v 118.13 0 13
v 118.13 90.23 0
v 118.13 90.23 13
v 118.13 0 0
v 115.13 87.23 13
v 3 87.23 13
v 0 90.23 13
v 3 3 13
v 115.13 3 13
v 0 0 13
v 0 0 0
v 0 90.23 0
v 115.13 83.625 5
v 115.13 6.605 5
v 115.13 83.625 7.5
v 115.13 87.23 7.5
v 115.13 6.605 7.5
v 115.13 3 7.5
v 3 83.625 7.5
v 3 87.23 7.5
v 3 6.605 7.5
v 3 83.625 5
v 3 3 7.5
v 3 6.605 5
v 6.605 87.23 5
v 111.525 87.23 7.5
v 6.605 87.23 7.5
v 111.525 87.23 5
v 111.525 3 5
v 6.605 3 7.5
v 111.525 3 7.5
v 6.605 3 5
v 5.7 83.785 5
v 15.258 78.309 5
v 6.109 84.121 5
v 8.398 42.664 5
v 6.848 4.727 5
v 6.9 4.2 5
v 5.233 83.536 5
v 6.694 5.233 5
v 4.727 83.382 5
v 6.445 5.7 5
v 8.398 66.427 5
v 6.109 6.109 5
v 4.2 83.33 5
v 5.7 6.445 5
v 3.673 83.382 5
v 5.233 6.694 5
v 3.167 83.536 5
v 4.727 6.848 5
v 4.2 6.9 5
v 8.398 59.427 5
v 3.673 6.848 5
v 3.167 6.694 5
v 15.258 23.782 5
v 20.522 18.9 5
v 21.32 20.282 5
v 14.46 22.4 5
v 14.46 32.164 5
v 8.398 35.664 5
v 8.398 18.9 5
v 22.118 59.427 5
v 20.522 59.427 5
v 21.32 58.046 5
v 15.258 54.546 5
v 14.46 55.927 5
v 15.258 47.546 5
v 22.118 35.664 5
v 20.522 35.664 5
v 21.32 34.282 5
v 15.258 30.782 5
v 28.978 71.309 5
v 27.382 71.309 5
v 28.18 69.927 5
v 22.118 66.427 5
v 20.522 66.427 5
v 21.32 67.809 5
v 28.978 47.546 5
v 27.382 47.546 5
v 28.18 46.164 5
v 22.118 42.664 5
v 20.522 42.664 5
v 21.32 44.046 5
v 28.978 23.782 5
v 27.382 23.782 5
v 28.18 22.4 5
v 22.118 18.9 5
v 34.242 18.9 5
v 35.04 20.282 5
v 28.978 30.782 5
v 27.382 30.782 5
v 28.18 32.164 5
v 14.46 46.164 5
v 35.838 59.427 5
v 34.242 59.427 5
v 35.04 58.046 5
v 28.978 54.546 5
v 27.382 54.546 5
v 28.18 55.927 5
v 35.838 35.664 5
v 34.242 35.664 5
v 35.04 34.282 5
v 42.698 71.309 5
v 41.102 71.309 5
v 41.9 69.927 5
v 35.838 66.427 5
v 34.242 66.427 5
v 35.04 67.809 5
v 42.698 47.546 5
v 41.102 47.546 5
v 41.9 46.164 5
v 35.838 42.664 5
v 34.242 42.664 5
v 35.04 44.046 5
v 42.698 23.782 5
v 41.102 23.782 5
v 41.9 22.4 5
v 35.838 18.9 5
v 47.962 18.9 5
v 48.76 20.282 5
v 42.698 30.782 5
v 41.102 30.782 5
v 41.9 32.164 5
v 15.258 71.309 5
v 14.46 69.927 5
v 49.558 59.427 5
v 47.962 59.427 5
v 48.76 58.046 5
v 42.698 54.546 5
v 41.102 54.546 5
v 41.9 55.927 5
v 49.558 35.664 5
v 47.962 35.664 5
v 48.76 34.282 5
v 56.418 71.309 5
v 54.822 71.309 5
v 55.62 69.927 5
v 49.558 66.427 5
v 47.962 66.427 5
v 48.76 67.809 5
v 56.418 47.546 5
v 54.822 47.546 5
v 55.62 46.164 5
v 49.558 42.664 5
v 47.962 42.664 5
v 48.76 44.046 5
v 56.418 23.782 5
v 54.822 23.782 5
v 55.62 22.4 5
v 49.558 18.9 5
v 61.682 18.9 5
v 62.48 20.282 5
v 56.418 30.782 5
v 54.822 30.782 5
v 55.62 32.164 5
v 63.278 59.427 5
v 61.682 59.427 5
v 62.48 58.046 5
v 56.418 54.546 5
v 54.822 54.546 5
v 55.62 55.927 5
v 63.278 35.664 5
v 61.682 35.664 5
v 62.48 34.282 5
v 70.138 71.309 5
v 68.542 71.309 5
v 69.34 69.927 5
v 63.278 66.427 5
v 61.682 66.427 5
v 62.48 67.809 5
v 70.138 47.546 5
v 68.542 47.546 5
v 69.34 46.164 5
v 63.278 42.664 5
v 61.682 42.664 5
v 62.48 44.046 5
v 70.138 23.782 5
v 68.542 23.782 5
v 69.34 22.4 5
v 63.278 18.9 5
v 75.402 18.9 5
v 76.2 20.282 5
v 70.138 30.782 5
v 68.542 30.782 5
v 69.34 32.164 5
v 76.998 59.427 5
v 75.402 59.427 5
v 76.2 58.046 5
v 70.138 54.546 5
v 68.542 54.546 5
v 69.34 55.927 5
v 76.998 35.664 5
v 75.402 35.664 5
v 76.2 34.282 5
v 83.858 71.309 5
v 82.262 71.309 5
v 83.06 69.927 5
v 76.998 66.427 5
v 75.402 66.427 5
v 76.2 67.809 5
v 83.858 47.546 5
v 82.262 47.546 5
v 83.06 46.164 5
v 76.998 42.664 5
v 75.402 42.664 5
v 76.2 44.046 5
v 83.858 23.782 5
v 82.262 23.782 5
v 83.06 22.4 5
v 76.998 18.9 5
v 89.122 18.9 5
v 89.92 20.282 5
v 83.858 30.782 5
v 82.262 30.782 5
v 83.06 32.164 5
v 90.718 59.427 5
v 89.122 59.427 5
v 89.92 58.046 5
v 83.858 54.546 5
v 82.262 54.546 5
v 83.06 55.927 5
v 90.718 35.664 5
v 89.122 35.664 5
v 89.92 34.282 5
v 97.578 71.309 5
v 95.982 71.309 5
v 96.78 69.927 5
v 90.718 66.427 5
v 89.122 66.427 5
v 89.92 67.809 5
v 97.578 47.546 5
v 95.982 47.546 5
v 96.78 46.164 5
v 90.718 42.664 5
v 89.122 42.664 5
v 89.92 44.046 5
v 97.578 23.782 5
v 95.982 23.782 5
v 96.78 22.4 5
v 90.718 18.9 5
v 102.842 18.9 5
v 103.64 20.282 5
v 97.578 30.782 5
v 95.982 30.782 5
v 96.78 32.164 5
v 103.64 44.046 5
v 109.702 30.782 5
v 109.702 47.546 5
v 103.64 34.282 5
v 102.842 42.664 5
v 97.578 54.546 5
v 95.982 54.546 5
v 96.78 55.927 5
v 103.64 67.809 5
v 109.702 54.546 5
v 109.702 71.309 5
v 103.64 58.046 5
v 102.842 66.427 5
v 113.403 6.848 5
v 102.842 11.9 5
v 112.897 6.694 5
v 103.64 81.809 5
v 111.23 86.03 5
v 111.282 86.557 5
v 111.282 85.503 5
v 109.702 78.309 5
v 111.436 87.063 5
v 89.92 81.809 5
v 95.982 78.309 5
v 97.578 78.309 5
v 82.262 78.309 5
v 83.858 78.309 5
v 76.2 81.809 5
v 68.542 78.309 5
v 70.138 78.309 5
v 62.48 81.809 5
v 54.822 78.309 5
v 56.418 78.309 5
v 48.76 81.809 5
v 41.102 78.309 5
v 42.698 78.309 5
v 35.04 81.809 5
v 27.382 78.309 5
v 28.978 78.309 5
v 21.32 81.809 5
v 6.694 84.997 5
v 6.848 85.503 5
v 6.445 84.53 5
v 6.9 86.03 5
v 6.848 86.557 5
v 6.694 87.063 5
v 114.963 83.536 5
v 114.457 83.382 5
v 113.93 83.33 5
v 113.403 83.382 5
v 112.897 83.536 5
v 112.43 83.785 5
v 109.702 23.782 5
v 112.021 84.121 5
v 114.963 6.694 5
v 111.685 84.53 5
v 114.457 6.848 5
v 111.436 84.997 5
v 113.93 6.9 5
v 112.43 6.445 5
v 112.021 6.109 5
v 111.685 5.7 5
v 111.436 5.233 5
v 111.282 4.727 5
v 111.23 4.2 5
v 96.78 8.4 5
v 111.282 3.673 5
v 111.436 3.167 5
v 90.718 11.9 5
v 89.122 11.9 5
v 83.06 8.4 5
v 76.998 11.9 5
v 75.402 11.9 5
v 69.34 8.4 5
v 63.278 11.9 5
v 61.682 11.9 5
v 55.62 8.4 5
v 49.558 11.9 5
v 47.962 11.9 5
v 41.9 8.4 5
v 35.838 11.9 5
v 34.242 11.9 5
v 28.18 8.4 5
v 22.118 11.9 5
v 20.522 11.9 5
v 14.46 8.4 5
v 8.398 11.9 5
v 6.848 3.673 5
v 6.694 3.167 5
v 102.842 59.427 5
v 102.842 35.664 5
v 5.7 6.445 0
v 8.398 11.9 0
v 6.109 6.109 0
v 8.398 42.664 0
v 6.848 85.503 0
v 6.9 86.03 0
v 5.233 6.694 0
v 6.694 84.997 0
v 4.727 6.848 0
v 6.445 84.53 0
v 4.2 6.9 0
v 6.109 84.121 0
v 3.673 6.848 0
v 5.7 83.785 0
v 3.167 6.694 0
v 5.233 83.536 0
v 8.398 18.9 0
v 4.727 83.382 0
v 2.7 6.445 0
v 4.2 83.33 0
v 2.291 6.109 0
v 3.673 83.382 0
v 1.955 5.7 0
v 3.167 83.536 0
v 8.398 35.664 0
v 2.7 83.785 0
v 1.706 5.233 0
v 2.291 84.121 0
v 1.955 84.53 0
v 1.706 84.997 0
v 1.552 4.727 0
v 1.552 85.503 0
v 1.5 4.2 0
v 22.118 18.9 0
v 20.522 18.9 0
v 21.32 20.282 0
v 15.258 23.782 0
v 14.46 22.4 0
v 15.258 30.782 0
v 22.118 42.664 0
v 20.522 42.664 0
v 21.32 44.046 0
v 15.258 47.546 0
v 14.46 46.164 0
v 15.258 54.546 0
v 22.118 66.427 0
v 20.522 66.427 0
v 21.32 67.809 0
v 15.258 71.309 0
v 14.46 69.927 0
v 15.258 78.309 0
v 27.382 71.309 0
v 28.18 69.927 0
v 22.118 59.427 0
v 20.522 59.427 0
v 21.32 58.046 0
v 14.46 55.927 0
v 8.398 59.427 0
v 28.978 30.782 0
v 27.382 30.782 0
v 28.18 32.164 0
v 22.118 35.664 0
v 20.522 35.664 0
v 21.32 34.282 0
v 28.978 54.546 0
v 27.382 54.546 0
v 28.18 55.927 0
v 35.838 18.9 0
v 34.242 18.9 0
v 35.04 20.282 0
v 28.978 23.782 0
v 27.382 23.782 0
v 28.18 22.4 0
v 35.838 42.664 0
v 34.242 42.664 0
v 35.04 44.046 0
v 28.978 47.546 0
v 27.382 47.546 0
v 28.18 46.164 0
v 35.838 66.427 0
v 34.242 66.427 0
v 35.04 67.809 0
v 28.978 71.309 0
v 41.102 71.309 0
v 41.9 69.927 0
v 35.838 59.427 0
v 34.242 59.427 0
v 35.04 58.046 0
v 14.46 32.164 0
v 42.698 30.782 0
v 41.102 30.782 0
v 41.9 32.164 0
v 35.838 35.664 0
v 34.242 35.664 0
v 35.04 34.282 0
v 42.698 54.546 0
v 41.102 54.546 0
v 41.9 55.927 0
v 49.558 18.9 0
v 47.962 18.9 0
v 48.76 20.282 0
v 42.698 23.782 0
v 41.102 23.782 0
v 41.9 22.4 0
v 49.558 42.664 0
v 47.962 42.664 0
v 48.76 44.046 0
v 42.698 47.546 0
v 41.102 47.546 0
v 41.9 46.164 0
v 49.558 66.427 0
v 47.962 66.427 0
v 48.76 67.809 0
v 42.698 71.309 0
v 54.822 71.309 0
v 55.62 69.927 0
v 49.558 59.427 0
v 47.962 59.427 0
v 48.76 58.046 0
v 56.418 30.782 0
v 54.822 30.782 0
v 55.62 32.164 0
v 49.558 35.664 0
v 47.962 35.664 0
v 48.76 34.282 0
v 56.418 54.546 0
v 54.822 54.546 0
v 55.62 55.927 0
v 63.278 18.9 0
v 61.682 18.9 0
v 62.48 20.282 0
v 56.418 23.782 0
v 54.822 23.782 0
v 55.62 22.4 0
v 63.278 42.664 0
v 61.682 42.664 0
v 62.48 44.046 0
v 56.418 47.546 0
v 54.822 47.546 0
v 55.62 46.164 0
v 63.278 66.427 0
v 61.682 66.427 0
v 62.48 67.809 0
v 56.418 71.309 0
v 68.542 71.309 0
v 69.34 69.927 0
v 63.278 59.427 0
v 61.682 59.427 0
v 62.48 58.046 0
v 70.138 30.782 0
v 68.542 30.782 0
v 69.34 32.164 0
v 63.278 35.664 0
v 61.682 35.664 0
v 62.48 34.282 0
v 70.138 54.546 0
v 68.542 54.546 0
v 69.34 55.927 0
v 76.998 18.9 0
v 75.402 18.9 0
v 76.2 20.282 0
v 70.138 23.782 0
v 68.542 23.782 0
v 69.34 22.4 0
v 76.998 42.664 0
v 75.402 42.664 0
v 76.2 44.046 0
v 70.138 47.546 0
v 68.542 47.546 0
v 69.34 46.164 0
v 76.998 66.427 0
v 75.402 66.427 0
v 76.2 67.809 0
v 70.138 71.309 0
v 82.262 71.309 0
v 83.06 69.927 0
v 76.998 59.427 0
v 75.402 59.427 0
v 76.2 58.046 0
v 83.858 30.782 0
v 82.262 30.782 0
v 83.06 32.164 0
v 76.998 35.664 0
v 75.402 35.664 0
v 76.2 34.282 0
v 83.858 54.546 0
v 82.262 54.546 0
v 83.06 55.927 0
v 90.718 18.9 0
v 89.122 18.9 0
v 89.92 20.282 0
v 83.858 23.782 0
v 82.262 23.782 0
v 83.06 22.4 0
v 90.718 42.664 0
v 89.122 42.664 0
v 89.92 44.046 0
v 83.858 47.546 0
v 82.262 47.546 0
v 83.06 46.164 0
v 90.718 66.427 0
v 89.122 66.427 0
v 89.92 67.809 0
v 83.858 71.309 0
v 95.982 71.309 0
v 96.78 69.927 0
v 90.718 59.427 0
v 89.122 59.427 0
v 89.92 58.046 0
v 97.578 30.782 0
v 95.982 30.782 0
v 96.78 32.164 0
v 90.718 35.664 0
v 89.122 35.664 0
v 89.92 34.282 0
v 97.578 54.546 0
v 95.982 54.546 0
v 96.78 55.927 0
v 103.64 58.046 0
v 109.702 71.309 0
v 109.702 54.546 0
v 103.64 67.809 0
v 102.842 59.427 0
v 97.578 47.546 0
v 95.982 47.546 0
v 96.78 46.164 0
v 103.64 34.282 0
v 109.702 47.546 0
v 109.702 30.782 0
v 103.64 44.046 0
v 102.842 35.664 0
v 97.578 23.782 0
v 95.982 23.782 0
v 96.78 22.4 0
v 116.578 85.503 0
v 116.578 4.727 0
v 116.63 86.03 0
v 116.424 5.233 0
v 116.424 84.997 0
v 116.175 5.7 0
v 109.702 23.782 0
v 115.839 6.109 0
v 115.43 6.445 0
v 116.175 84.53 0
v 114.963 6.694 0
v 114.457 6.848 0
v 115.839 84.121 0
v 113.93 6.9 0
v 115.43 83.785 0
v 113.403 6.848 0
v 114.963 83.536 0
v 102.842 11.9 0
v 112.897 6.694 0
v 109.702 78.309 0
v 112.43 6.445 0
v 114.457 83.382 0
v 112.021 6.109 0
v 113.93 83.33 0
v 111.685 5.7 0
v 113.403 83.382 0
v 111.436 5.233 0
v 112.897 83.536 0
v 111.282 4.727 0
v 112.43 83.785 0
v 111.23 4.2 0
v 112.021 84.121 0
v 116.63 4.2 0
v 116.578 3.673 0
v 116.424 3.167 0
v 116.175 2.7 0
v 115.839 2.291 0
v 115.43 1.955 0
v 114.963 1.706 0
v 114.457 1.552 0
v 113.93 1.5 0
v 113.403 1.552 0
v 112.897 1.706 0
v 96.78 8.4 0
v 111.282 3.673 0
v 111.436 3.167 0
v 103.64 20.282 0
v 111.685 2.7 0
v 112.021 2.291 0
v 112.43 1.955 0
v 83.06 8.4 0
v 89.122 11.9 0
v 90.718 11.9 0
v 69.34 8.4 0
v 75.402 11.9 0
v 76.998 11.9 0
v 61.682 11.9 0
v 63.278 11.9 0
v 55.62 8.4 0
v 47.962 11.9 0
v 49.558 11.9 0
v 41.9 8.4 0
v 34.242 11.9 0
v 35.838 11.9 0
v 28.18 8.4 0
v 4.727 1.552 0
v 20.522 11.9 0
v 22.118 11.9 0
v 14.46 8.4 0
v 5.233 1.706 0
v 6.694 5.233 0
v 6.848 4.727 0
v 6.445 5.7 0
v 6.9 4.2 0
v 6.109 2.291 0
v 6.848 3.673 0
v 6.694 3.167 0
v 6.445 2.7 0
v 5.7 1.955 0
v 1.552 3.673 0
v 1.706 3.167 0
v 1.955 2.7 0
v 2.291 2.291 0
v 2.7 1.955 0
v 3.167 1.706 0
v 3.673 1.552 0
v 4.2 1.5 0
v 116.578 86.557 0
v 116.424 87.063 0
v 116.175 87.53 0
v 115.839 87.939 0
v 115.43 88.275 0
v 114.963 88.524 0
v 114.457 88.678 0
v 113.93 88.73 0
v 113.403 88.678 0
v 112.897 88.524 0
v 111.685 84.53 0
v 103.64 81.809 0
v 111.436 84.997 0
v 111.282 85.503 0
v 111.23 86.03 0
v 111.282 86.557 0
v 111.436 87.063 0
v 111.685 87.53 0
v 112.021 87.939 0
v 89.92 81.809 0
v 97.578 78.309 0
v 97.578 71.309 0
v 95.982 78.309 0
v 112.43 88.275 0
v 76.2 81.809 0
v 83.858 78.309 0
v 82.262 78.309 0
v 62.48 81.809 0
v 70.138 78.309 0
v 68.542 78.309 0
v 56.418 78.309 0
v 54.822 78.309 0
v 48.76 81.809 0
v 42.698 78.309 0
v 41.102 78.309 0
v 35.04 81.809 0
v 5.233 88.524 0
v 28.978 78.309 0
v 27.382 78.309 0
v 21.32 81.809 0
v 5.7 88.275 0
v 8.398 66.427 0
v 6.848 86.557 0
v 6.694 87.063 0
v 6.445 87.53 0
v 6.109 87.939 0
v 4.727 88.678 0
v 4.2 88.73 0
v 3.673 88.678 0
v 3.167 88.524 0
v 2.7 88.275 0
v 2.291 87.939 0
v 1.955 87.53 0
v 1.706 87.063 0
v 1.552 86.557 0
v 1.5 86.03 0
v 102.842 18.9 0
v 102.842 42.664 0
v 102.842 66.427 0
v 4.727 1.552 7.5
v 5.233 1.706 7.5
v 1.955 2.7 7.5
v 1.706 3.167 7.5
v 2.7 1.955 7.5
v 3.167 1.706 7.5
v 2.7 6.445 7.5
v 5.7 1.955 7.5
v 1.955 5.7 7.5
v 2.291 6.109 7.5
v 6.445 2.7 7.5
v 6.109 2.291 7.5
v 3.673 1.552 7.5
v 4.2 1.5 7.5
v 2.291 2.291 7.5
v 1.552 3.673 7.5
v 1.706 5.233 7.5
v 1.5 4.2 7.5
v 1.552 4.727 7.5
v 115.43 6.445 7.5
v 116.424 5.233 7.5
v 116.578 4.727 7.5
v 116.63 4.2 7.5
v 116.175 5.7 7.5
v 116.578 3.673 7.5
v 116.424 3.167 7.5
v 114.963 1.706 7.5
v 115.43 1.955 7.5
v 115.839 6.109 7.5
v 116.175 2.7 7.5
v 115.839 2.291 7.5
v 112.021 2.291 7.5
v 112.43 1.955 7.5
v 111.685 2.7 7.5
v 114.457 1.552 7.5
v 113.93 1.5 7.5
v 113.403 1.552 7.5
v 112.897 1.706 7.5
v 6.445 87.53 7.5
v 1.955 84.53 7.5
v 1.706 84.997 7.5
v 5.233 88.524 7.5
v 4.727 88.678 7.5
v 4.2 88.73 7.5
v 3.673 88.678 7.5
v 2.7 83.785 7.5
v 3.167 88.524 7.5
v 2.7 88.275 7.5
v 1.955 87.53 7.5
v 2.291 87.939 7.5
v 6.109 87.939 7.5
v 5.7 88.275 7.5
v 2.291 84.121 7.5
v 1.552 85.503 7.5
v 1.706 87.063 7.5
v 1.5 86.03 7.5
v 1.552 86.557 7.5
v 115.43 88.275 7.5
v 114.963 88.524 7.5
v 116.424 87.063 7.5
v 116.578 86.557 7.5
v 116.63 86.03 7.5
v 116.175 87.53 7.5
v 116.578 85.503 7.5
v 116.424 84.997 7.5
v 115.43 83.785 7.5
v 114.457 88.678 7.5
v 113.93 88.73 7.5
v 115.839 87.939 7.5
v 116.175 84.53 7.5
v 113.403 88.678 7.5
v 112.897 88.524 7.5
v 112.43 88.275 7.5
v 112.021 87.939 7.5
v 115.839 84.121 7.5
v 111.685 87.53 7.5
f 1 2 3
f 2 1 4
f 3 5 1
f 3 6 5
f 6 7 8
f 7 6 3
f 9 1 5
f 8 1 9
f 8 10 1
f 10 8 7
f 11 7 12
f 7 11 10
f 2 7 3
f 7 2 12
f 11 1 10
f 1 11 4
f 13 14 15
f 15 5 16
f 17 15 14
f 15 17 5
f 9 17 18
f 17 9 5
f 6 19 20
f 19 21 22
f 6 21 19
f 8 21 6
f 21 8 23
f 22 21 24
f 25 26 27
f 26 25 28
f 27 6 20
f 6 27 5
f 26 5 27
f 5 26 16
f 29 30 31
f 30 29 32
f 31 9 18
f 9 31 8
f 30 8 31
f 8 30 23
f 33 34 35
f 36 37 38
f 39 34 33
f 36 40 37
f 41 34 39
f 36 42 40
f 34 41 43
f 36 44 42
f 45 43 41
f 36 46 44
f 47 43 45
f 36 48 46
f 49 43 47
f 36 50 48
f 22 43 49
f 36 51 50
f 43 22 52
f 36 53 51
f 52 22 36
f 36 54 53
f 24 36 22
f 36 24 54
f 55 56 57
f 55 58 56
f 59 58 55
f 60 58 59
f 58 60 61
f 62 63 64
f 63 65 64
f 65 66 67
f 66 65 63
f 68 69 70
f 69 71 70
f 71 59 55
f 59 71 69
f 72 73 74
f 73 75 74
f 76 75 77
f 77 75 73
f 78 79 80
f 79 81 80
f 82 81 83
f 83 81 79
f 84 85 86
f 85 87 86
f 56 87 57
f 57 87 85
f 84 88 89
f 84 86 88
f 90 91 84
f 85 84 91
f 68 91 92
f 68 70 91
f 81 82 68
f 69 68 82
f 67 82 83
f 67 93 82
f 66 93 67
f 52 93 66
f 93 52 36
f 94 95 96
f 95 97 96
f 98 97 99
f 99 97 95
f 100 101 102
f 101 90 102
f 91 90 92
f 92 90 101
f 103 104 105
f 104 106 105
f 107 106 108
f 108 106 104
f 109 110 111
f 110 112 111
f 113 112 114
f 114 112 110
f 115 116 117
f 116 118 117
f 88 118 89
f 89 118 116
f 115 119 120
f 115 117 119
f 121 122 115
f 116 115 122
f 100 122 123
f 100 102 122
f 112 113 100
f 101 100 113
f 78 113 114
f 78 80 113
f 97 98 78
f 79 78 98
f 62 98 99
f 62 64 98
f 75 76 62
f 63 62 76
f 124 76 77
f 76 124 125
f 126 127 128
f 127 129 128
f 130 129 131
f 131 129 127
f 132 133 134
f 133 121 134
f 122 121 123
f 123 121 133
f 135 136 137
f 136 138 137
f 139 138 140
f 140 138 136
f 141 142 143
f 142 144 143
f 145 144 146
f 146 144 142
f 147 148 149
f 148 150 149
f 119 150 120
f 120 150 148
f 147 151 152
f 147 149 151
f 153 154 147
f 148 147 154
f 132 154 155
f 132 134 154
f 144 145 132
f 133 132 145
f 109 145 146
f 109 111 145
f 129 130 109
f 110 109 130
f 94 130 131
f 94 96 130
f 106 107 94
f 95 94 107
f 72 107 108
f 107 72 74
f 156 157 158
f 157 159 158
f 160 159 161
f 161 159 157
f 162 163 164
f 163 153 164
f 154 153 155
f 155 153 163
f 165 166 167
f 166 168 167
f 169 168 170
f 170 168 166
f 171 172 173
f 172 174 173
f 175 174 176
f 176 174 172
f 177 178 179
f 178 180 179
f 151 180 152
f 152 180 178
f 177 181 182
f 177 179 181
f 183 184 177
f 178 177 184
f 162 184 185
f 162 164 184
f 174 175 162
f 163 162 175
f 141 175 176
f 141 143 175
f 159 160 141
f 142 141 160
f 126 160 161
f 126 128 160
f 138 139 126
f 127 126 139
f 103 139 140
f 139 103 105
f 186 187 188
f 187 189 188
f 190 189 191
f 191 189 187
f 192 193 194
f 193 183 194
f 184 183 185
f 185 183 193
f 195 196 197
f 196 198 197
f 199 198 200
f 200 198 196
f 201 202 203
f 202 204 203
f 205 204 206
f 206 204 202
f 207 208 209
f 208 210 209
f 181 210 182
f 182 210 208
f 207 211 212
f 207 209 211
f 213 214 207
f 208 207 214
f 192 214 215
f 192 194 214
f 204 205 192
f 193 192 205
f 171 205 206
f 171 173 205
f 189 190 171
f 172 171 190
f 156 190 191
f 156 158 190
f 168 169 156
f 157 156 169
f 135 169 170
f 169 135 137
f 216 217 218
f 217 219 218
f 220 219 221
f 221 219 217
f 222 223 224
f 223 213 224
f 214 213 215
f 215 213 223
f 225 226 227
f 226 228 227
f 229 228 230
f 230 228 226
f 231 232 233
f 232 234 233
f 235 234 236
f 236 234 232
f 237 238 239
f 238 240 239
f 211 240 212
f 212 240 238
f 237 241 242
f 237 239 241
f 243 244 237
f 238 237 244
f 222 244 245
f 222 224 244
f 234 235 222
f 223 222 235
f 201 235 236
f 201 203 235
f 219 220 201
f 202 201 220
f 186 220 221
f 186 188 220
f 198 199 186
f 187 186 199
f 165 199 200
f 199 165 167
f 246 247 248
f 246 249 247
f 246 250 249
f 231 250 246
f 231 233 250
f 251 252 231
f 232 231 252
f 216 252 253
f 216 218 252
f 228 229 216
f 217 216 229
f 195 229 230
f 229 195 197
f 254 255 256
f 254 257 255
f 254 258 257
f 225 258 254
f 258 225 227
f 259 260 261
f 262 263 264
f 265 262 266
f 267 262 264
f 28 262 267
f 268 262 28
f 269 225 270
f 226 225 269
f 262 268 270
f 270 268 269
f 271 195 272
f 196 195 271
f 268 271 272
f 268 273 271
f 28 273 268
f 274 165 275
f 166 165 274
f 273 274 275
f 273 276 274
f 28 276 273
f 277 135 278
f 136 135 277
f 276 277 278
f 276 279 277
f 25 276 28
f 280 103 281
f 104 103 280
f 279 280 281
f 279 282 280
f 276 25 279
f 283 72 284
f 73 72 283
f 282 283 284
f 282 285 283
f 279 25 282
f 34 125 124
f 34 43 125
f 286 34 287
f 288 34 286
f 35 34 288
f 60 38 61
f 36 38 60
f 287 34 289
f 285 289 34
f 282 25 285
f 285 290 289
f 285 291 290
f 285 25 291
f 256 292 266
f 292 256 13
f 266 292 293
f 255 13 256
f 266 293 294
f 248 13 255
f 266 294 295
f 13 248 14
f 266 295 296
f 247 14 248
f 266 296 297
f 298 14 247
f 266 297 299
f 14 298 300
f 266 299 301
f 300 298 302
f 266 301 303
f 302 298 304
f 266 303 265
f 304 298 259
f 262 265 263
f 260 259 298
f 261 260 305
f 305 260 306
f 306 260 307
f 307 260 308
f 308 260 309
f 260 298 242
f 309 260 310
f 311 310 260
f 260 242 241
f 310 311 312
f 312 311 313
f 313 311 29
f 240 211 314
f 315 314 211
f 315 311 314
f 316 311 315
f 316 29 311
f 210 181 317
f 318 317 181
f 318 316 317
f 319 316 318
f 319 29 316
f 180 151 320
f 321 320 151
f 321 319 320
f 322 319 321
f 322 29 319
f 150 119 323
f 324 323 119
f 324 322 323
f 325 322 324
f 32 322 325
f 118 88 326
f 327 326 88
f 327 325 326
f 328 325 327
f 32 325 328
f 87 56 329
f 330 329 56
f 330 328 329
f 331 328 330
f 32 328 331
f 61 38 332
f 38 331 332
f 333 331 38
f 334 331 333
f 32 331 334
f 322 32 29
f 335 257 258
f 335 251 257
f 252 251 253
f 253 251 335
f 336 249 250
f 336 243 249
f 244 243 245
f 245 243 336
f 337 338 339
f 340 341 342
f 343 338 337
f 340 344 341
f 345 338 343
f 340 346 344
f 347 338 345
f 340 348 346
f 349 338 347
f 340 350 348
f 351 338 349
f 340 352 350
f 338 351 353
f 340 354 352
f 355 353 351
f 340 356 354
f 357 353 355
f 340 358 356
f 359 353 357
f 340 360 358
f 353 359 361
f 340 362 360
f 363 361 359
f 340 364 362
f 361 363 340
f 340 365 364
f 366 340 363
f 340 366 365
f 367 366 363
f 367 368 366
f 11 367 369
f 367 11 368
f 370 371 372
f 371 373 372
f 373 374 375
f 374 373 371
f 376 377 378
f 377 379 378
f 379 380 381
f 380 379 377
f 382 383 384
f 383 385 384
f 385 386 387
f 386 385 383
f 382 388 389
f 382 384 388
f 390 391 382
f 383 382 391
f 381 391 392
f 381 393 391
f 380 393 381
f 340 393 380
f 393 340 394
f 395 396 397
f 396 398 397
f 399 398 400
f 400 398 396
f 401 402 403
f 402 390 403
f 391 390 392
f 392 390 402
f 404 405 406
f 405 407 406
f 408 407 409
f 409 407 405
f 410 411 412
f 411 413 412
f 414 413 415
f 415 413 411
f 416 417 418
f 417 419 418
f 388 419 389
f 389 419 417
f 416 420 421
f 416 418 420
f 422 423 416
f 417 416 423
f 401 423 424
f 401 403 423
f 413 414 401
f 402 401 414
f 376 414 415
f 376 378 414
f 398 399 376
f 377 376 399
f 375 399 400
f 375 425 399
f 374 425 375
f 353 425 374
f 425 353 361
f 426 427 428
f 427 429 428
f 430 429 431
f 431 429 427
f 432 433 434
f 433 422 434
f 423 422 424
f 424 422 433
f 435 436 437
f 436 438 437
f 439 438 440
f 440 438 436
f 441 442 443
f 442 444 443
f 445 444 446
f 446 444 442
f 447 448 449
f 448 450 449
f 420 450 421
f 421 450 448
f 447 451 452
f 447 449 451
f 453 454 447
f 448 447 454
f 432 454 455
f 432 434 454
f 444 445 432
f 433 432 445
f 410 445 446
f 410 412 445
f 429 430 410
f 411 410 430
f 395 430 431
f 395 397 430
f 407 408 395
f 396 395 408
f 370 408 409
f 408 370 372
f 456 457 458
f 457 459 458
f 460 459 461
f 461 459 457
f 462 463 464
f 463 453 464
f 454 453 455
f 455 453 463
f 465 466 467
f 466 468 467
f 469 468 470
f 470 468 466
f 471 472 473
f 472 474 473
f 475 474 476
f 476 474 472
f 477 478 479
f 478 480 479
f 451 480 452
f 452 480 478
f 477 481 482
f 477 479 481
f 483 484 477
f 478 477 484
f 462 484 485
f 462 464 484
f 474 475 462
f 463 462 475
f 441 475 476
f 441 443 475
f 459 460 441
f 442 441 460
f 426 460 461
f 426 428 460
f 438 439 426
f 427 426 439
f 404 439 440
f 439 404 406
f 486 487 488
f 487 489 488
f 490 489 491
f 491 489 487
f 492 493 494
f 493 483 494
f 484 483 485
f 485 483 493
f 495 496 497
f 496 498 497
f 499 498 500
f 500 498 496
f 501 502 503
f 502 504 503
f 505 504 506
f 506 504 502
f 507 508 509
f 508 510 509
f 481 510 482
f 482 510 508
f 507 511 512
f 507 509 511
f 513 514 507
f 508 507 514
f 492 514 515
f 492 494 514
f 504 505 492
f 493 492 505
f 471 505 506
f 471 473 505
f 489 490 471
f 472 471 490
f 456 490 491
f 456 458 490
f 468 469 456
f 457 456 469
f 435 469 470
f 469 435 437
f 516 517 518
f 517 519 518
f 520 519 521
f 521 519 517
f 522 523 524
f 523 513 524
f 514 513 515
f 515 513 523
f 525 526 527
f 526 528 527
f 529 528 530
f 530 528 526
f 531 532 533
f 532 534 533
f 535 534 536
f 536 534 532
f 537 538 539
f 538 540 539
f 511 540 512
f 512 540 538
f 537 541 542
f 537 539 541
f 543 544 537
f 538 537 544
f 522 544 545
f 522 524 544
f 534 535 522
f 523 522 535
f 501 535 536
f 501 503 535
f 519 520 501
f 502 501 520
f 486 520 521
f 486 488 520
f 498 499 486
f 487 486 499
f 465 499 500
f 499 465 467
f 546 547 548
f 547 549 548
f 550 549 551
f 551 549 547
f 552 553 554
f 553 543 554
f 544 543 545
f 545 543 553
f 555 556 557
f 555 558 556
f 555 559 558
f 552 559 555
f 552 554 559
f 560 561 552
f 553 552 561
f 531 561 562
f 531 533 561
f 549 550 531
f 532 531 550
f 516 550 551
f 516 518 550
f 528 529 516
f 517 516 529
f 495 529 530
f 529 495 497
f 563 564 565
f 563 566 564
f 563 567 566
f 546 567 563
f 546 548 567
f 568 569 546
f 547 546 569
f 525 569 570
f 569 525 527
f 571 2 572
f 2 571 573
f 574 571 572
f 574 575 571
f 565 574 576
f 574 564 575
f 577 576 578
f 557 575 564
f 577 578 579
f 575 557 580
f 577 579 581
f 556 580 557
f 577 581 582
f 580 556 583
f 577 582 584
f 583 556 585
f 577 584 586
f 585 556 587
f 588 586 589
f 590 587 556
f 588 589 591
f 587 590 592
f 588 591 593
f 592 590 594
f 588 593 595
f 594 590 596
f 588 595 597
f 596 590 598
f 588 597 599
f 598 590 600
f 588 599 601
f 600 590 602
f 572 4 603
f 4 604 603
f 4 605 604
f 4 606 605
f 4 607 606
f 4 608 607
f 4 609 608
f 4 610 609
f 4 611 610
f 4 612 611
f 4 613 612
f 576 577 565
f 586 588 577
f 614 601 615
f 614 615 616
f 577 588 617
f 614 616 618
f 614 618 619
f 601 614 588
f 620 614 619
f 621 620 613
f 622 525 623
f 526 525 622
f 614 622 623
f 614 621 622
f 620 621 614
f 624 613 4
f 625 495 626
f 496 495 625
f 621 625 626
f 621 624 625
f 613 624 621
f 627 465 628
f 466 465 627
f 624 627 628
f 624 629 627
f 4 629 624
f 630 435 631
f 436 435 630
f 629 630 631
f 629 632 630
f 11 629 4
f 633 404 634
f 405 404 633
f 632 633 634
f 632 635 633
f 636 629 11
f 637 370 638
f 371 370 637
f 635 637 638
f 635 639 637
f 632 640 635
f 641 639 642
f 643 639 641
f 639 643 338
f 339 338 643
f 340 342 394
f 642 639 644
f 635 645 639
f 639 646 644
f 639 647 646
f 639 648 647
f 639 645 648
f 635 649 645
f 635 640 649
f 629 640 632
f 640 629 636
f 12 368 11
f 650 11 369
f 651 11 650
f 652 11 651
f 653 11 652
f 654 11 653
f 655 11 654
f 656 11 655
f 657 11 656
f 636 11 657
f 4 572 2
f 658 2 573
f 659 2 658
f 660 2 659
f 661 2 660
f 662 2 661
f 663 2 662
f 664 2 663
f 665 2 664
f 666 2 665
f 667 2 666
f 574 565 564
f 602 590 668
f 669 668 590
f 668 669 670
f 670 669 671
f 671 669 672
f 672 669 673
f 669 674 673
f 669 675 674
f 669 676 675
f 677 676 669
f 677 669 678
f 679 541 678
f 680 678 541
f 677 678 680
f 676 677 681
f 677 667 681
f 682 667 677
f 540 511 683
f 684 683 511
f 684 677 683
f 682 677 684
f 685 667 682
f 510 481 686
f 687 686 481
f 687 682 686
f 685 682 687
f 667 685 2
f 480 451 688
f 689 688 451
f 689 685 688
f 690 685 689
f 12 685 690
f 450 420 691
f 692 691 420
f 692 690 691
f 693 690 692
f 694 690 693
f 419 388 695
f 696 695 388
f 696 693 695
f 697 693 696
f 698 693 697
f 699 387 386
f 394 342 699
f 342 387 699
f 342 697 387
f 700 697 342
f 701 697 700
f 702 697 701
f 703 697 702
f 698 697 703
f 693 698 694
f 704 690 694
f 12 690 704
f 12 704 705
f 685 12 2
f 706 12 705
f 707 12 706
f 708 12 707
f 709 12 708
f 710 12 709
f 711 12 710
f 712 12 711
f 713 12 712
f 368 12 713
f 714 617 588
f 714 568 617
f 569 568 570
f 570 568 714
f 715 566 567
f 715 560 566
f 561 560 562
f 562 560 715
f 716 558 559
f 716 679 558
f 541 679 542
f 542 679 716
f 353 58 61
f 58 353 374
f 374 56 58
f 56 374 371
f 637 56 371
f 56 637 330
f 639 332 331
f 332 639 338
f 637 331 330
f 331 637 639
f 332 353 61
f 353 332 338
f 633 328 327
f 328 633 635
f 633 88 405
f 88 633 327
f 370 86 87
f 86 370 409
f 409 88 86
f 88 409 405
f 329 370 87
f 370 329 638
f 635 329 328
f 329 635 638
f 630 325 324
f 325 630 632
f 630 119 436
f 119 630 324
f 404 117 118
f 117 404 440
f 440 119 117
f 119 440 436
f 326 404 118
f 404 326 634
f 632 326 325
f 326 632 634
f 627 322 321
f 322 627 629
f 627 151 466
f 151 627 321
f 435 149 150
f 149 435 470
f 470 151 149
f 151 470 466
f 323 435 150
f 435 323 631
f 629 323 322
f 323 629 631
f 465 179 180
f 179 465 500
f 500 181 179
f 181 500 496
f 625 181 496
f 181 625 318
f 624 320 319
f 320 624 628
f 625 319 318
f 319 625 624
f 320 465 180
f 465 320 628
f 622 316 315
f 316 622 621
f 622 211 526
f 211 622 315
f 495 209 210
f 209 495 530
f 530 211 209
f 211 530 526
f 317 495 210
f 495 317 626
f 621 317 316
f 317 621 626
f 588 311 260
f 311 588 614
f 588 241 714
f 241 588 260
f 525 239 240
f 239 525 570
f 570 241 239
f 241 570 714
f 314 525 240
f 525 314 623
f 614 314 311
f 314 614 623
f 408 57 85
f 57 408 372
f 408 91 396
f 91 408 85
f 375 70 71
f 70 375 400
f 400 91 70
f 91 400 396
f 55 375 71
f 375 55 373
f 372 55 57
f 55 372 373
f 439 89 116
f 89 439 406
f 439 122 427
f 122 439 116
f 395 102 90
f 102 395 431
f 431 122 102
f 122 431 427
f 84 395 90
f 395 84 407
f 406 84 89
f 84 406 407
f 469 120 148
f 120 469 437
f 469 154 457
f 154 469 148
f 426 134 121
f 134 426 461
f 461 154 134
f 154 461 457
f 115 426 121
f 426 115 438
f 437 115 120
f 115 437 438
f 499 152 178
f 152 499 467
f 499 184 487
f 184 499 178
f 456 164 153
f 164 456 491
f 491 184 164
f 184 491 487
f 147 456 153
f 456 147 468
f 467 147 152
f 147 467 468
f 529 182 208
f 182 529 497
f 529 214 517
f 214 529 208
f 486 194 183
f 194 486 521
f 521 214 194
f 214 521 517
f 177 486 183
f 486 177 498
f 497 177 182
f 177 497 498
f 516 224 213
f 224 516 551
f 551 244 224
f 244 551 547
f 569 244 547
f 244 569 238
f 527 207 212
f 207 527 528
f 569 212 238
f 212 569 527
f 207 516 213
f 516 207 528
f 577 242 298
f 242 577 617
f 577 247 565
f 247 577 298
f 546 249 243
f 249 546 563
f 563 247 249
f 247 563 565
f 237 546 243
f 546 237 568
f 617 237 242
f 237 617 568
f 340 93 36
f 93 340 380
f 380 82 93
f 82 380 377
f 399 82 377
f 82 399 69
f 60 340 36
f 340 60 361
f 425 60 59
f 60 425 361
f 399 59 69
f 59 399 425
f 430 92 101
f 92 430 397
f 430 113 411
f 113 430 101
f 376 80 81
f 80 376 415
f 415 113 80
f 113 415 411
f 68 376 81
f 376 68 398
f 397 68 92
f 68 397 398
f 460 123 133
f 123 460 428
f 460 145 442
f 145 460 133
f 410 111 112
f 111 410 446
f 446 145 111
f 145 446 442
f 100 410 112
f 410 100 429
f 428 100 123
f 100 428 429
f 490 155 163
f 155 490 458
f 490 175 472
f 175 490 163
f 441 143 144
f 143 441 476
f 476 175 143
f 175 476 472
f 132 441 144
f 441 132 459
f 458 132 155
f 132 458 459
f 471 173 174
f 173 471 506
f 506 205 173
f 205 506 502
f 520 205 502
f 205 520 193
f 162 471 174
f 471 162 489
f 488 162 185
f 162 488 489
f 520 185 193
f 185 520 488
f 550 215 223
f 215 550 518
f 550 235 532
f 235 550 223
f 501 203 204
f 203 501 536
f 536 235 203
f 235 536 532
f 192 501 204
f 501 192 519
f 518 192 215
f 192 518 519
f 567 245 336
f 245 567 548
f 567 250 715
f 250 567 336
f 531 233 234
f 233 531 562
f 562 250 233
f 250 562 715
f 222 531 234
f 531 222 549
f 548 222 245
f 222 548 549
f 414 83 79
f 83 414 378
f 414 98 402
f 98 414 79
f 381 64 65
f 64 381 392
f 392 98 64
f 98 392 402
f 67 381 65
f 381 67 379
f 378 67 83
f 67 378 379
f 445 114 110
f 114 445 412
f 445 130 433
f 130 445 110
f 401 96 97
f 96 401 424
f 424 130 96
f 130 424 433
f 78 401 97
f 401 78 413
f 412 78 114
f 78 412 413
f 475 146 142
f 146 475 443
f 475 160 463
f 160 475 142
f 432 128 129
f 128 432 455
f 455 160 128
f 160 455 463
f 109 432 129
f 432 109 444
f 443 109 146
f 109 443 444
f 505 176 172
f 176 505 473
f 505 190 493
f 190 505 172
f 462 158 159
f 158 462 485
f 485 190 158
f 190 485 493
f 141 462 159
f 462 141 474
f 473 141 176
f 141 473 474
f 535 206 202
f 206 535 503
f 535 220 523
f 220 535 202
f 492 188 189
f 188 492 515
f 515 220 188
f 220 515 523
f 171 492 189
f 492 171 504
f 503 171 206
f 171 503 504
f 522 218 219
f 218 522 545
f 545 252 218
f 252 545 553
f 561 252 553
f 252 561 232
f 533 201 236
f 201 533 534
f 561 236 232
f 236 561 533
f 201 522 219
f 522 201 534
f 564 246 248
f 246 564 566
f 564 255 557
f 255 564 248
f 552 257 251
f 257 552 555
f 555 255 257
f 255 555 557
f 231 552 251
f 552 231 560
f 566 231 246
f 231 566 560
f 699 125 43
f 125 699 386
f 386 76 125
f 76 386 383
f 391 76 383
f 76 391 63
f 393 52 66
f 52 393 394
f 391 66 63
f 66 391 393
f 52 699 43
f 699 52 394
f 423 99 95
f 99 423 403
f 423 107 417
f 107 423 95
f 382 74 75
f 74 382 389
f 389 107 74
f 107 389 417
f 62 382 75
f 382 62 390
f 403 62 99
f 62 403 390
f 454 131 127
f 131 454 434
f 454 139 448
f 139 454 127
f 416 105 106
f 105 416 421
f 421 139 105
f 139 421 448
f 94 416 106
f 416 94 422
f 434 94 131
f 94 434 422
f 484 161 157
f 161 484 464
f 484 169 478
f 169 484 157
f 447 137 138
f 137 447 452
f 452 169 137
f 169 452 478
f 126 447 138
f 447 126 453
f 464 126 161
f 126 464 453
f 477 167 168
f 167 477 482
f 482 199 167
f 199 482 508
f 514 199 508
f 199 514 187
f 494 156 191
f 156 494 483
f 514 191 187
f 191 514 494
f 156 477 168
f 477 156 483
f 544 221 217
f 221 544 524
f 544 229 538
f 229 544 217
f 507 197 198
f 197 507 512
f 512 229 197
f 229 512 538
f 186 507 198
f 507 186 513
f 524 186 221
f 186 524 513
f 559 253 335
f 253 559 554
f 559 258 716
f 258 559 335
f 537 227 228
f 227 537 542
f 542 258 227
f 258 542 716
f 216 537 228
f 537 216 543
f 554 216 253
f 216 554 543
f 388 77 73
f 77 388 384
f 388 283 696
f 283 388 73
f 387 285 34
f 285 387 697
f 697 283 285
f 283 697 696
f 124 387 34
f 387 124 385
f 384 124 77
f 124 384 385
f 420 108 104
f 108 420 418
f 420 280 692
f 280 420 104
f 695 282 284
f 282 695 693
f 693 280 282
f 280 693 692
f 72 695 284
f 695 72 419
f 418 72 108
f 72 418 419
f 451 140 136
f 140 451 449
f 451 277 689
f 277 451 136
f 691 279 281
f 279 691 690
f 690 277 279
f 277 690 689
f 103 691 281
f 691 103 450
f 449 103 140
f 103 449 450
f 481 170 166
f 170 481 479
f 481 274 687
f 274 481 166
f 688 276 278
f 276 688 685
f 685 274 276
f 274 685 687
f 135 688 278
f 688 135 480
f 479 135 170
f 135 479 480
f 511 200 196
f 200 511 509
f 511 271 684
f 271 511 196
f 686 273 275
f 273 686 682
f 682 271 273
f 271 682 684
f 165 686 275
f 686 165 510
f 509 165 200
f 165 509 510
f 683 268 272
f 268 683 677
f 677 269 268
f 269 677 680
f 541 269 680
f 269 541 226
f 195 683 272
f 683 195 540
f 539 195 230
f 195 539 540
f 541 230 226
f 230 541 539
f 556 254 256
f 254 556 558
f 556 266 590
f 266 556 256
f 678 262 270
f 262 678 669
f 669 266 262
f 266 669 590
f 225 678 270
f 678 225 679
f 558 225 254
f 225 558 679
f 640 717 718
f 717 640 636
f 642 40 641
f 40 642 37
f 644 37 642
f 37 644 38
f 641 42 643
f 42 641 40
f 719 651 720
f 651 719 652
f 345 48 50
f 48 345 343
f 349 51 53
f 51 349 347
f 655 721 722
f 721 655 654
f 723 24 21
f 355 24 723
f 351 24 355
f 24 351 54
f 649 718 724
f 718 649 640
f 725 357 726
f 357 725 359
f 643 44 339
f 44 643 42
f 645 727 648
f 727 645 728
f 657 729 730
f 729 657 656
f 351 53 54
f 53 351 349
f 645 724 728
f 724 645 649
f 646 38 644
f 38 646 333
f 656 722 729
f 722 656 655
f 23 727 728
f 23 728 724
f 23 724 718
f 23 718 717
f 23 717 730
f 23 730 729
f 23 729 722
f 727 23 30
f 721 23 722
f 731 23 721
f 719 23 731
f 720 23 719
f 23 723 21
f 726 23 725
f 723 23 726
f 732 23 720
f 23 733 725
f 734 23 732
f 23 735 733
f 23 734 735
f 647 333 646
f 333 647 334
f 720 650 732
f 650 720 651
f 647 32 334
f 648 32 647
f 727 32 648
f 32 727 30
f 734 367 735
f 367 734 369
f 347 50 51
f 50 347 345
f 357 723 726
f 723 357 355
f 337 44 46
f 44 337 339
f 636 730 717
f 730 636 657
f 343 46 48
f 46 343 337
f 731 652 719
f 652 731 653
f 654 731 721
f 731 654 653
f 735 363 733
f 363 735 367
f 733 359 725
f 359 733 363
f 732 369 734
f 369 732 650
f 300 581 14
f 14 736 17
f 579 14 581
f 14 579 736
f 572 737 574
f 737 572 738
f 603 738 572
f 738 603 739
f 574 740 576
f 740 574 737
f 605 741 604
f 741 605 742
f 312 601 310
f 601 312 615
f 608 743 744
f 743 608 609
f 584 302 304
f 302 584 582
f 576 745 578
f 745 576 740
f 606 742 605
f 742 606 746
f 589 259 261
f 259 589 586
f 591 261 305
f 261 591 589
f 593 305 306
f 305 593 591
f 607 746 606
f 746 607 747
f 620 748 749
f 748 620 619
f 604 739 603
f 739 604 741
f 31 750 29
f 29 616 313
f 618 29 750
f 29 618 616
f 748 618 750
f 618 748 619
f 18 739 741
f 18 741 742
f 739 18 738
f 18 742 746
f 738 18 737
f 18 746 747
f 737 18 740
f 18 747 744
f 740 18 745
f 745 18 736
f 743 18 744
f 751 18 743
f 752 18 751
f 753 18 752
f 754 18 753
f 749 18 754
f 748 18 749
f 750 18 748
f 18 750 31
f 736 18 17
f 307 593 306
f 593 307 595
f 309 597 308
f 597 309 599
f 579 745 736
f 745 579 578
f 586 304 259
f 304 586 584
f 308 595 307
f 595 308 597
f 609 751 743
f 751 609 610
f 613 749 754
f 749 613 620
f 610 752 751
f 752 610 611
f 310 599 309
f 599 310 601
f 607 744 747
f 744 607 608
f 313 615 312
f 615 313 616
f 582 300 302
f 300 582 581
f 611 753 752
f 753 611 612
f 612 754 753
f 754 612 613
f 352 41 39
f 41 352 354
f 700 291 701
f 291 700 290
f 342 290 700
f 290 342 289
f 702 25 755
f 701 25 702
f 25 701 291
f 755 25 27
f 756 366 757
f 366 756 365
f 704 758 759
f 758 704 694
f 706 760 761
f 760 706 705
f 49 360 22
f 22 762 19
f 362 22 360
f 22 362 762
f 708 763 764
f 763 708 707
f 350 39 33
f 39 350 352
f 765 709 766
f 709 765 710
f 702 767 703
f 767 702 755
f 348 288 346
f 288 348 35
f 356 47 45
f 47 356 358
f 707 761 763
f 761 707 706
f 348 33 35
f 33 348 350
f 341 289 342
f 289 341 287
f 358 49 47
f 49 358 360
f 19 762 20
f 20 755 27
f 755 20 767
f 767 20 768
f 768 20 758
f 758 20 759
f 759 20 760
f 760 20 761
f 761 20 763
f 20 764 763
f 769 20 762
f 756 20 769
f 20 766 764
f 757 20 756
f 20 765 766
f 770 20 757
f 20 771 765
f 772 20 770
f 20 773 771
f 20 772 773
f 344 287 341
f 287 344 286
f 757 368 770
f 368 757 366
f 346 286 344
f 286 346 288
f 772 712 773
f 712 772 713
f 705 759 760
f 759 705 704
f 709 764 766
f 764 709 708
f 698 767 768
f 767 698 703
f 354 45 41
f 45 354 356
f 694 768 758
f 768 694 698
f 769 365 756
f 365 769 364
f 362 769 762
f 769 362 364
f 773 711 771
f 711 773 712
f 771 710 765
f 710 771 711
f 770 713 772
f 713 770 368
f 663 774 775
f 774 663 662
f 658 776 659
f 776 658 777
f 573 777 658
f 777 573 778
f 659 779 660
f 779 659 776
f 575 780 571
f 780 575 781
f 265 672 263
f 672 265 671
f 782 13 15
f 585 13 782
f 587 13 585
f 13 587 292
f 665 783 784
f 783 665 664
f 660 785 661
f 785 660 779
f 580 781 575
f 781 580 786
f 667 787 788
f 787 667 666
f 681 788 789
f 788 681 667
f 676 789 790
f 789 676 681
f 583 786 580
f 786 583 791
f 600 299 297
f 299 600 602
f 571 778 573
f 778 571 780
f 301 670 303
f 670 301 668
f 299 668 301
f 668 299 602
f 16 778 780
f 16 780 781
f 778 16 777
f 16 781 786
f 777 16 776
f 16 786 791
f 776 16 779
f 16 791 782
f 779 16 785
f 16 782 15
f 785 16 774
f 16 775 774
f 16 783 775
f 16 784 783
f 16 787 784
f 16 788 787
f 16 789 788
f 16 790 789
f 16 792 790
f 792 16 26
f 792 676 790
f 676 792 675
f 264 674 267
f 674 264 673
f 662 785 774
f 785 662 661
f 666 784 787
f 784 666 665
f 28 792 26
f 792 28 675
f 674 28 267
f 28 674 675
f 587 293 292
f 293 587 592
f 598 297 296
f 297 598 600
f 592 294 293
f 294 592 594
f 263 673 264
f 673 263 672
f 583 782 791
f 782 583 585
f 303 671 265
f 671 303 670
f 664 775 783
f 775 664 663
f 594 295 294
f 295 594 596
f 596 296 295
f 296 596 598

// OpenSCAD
$fn = 32;

// ----------------------------------------------------------------------
// Honeycomb panel: 118.13 x 90.23 mm, 42 cells of 14 mm
// ----------------------------------------------------------------------

// --- parameters (mm) ---
panel_w = 118.13;         // panel width
panel_d = 90.23;          // panel depth
thick = 5;                // panel thickness
cell_r = 7;               // hex cell circumradius
pitch = 13.72;            // hex cell pitch (centre to centre)
web = 1.6;                // web between the cells
columns = 7;              // columns of cells
rows = 6;                 // rows of cells
cell_count = 42;          // total cells
shift_x = 14.46;          // first cell offset in x
shift_y = 15.4;           // first cell offset in y
mount_d = 5.4;            // corner mounting holes
hole_off = 4.2;           // mounting hole offset from the corners
rim_h = 13;               // rim height
rim_t = 3;                // rim wall thickness

difference() {
  union() {
    cube([panel_w, panel_d, thick]);
    /* rim around the panel, sunk 1 mm into the plate */
    translate([0, 0, thick - 1]) difference() {
      cube([panel_w, panel_d, rim_h - thick + 1]);
      translate([rim_t, rim_t, -2.5]) cube([panel_w - 2 * rim_t, panel_d - 2 * rim_t, rim_h - thick + 6]);
    }
  }
  /* hexagonal cells, point-up, cut right through the plate */
  for (row = [0 : rows - 1]) {
    for (col = [0 : columns - 1]) {
      translate([shift_x + col * pitch + (row % 2) * pitch / 2, shift_y + row * pitch * 0.866025, -2.5]) rotate([0, 0, 30]) cylinder(h = thick + 5, d = 2 * cell_r, $fn = 6);
    }
  }
  /* corner mounting holes, clear of the outer cell web */
  translate([4.2, 4.2, -2.5]) cylinder(h = thick + 5, d = mount_d);
  translate([113.93, 4.2, -2.5]) cylinder(h = thick + 5, d = mount_d);
  translate([4.2, 86.03, -2.5]) cylinder(h = thick + 5, d = mount_d);
  translate([113.93, 86.03, -2.5]) cylinder(h = thick + 5, d = mount_d);
}
